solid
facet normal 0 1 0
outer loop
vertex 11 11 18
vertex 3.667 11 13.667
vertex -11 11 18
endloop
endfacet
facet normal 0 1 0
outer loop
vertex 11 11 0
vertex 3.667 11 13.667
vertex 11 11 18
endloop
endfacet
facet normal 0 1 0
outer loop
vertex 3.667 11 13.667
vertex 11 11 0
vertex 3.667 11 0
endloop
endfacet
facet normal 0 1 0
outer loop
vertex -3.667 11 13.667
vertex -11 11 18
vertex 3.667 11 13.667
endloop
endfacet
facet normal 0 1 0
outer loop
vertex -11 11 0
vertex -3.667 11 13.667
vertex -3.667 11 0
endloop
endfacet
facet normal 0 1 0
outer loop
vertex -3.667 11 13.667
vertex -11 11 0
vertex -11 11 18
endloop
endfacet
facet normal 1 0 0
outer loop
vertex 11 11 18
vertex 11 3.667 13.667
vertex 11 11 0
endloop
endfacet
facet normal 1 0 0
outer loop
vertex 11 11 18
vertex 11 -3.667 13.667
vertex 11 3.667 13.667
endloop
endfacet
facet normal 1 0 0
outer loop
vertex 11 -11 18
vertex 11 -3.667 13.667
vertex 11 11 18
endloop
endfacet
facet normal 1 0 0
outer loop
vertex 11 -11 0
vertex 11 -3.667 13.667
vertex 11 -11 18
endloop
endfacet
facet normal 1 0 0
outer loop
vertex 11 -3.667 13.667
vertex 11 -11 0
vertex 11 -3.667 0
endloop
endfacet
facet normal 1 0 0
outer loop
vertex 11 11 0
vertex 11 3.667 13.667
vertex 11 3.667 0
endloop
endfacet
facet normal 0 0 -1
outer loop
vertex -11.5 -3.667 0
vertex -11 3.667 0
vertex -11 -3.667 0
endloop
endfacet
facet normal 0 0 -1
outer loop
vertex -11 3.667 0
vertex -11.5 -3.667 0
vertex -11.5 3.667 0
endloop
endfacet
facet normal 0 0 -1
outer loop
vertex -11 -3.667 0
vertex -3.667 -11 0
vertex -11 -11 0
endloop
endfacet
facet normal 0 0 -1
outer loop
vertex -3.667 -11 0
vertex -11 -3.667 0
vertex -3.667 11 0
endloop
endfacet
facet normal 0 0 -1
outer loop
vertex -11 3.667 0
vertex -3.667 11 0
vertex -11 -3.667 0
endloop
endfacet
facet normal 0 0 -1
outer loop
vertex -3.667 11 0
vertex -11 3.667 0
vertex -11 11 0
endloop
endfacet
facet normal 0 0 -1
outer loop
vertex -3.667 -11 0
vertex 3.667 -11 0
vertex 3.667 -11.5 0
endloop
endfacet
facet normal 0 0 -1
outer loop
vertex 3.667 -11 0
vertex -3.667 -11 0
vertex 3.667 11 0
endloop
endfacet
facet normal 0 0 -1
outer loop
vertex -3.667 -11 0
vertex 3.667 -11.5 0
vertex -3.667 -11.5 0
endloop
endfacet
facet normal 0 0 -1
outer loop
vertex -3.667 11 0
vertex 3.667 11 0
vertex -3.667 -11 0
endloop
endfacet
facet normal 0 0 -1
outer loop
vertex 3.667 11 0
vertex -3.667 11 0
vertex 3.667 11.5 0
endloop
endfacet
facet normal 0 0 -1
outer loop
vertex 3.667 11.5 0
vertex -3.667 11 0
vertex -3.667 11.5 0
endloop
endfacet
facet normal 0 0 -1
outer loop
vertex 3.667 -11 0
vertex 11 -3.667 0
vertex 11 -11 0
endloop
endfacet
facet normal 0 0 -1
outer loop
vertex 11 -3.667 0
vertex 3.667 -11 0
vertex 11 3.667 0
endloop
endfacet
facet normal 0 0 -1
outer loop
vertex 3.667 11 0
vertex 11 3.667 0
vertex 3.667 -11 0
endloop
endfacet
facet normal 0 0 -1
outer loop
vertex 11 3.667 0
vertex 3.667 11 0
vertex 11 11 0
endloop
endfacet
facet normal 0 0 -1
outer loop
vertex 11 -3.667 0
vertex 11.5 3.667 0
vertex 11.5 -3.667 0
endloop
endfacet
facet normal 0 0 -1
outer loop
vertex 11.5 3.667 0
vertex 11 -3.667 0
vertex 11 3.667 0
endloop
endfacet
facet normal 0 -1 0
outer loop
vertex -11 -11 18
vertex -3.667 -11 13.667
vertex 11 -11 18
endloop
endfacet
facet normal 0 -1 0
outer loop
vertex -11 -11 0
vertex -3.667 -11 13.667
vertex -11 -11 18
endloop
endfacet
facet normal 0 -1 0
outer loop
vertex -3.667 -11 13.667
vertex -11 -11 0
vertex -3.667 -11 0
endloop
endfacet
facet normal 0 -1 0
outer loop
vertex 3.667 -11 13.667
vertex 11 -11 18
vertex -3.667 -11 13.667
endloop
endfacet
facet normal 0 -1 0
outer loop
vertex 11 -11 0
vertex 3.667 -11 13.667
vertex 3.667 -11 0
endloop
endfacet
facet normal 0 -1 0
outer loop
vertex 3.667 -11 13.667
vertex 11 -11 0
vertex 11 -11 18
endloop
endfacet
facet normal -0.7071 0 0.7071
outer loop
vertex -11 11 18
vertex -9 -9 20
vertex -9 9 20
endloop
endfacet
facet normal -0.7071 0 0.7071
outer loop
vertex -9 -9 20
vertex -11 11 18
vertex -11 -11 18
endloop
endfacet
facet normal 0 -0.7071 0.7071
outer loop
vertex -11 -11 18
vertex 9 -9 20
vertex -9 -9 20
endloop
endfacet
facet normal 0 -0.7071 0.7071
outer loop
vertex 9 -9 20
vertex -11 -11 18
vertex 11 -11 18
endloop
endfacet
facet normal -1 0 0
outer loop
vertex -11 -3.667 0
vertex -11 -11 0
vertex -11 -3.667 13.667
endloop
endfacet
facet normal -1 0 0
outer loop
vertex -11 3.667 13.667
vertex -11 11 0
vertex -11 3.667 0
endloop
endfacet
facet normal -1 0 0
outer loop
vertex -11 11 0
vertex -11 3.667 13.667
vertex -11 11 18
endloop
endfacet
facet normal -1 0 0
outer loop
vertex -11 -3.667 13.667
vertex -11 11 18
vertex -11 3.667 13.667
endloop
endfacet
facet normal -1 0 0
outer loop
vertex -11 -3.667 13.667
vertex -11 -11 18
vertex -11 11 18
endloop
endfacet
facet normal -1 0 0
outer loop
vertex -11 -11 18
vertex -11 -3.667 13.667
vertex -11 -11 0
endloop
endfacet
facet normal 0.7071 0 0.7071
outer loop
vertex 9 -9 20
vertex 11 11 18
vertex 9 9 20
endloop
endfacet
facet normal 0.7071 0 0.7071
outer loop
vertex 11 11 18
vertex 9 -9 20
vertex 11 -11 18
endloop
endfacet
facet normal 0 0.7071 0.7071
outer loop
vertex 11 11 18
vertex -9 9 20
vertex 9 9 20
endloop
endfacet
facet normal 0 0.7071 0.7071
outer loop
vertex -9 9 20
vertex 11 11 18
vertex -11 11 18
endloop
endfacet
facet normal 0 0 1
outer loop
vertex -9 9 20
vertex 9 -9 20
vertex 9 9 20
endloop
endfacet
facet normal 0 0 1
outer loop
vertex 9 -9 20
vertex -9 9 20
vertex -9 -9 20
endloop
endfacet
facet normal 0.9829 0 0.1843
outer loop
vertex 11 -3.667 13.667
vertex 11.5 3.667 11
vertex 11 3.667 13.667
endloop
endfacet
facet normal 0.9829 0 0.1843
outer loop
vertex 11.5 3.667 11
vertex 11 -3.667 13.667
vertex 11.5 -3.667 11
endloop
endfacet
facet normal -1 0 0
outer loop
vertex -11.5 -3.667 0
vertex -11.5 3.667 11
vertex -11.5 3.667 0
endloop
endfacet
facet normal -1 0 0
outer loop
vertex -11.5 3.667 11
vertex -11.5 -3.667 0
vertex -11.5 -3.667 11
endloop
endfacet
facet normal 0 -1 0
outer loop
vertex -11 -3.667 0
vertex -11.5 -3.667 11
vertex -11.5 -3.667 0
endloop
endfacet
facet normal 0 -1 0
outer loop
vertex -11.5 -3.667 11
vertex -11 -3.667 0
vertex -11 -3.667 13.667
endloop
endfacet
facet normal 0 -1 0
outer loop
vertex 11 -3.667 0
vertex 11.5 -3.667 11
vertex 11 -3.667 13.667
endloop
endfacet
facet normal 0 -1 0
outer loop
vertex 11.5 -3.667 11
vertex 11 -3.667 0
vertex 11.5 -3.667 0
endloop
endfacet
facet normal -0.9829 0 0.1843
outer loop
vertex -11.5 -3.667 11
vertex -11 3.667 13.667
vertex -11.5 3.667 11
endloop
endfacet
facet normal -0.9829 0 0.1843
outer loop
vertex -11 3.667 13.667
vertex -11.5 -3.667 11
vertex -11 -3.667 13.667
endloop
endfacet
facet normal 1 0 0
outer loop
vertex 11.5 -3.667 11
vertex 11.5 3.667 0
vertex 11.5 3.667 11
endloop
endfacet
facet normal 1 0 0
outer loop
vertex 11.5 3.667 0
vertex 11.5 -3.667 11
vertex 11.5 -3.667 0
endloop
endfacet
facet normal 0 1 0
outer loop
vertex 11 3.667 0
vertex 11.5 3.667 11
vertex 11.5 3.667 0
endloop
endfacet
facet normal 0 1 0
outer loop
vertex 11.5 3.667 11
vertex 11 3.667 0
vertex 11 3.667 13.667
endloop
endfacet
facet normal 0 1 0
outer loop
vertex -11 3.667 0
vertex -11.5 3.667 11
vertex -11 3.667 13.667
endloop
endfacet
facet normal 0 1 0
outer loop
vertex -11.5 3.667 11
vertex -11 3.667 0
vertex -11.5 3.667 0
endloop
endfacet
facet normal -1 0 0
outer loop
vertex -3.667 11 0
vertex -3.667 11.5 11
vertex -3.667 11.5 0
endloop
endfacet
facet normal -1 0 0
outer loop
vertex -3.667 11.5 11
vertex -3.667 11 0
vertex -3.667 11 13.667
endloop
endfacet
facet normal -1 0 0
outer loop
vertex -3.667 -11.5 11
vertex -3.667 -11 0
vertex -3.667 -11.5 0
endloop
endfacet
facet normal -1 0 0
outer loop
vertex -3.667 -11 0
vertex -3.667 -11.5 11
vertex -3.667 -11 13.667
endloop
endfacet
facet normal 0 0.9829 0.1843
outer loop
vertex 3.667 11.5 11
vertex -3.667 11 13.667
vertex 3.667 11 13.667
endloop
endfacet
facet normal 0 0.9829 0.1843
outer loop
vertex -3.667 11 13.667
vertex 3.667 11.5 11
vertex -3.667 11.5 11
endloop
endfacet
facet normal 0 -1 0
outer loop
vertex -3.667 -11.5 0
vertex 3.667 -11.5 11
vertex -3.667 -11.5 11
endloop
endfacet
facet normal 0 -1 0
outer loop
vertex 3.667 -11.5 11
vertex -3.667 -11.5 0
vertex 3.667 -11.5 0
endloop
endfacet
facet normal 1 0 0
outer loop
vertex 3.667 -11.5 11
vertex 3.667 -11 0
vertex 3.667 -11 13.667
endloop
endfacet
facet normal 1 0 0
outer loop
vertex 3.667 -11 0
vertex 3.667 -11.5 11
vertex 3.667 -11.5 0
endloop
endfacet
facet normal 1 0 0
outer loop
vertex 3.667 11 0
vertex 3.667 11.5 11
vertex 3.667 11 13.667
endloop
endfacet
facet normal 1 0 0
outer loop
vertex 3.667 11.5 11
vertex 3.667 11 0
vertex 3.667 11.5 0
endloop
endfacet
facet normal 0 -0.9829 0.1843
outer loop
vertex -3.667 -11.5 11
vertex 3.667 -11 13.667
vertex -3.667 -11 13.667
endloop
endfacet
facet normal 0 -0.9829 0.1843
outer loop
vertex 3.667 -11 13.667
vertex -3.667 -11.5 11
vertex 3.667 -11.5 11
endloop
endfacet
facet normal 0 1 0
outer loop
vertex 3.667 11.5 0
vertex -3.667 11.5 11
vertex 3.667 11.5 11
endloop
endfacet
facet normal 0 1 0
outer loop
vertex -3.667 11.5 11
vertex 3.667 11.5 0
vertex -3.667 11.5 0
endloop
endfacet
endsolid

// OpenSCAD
module square_tube_joint(height, size=[22, 22]) {
    height = max(height, 10);
    module wedge(x, y) hull() {
        linear_extrude(height - 9) square([x + 1, y], center=true);
        linear_extrude(height - 1) square([x - 2, y], center=true);
    }
    hull() {
        linear_extrude(height) square([size[0] - 4, size[1] - 4], center=true);
        linear_extrude(height - 2) square(size, center=true);
    }
    wedge(size[0], size[1] / 3);
    rotate(90) wedge(size[1], size[0] / 3);
}

square_tube_joint(20);
